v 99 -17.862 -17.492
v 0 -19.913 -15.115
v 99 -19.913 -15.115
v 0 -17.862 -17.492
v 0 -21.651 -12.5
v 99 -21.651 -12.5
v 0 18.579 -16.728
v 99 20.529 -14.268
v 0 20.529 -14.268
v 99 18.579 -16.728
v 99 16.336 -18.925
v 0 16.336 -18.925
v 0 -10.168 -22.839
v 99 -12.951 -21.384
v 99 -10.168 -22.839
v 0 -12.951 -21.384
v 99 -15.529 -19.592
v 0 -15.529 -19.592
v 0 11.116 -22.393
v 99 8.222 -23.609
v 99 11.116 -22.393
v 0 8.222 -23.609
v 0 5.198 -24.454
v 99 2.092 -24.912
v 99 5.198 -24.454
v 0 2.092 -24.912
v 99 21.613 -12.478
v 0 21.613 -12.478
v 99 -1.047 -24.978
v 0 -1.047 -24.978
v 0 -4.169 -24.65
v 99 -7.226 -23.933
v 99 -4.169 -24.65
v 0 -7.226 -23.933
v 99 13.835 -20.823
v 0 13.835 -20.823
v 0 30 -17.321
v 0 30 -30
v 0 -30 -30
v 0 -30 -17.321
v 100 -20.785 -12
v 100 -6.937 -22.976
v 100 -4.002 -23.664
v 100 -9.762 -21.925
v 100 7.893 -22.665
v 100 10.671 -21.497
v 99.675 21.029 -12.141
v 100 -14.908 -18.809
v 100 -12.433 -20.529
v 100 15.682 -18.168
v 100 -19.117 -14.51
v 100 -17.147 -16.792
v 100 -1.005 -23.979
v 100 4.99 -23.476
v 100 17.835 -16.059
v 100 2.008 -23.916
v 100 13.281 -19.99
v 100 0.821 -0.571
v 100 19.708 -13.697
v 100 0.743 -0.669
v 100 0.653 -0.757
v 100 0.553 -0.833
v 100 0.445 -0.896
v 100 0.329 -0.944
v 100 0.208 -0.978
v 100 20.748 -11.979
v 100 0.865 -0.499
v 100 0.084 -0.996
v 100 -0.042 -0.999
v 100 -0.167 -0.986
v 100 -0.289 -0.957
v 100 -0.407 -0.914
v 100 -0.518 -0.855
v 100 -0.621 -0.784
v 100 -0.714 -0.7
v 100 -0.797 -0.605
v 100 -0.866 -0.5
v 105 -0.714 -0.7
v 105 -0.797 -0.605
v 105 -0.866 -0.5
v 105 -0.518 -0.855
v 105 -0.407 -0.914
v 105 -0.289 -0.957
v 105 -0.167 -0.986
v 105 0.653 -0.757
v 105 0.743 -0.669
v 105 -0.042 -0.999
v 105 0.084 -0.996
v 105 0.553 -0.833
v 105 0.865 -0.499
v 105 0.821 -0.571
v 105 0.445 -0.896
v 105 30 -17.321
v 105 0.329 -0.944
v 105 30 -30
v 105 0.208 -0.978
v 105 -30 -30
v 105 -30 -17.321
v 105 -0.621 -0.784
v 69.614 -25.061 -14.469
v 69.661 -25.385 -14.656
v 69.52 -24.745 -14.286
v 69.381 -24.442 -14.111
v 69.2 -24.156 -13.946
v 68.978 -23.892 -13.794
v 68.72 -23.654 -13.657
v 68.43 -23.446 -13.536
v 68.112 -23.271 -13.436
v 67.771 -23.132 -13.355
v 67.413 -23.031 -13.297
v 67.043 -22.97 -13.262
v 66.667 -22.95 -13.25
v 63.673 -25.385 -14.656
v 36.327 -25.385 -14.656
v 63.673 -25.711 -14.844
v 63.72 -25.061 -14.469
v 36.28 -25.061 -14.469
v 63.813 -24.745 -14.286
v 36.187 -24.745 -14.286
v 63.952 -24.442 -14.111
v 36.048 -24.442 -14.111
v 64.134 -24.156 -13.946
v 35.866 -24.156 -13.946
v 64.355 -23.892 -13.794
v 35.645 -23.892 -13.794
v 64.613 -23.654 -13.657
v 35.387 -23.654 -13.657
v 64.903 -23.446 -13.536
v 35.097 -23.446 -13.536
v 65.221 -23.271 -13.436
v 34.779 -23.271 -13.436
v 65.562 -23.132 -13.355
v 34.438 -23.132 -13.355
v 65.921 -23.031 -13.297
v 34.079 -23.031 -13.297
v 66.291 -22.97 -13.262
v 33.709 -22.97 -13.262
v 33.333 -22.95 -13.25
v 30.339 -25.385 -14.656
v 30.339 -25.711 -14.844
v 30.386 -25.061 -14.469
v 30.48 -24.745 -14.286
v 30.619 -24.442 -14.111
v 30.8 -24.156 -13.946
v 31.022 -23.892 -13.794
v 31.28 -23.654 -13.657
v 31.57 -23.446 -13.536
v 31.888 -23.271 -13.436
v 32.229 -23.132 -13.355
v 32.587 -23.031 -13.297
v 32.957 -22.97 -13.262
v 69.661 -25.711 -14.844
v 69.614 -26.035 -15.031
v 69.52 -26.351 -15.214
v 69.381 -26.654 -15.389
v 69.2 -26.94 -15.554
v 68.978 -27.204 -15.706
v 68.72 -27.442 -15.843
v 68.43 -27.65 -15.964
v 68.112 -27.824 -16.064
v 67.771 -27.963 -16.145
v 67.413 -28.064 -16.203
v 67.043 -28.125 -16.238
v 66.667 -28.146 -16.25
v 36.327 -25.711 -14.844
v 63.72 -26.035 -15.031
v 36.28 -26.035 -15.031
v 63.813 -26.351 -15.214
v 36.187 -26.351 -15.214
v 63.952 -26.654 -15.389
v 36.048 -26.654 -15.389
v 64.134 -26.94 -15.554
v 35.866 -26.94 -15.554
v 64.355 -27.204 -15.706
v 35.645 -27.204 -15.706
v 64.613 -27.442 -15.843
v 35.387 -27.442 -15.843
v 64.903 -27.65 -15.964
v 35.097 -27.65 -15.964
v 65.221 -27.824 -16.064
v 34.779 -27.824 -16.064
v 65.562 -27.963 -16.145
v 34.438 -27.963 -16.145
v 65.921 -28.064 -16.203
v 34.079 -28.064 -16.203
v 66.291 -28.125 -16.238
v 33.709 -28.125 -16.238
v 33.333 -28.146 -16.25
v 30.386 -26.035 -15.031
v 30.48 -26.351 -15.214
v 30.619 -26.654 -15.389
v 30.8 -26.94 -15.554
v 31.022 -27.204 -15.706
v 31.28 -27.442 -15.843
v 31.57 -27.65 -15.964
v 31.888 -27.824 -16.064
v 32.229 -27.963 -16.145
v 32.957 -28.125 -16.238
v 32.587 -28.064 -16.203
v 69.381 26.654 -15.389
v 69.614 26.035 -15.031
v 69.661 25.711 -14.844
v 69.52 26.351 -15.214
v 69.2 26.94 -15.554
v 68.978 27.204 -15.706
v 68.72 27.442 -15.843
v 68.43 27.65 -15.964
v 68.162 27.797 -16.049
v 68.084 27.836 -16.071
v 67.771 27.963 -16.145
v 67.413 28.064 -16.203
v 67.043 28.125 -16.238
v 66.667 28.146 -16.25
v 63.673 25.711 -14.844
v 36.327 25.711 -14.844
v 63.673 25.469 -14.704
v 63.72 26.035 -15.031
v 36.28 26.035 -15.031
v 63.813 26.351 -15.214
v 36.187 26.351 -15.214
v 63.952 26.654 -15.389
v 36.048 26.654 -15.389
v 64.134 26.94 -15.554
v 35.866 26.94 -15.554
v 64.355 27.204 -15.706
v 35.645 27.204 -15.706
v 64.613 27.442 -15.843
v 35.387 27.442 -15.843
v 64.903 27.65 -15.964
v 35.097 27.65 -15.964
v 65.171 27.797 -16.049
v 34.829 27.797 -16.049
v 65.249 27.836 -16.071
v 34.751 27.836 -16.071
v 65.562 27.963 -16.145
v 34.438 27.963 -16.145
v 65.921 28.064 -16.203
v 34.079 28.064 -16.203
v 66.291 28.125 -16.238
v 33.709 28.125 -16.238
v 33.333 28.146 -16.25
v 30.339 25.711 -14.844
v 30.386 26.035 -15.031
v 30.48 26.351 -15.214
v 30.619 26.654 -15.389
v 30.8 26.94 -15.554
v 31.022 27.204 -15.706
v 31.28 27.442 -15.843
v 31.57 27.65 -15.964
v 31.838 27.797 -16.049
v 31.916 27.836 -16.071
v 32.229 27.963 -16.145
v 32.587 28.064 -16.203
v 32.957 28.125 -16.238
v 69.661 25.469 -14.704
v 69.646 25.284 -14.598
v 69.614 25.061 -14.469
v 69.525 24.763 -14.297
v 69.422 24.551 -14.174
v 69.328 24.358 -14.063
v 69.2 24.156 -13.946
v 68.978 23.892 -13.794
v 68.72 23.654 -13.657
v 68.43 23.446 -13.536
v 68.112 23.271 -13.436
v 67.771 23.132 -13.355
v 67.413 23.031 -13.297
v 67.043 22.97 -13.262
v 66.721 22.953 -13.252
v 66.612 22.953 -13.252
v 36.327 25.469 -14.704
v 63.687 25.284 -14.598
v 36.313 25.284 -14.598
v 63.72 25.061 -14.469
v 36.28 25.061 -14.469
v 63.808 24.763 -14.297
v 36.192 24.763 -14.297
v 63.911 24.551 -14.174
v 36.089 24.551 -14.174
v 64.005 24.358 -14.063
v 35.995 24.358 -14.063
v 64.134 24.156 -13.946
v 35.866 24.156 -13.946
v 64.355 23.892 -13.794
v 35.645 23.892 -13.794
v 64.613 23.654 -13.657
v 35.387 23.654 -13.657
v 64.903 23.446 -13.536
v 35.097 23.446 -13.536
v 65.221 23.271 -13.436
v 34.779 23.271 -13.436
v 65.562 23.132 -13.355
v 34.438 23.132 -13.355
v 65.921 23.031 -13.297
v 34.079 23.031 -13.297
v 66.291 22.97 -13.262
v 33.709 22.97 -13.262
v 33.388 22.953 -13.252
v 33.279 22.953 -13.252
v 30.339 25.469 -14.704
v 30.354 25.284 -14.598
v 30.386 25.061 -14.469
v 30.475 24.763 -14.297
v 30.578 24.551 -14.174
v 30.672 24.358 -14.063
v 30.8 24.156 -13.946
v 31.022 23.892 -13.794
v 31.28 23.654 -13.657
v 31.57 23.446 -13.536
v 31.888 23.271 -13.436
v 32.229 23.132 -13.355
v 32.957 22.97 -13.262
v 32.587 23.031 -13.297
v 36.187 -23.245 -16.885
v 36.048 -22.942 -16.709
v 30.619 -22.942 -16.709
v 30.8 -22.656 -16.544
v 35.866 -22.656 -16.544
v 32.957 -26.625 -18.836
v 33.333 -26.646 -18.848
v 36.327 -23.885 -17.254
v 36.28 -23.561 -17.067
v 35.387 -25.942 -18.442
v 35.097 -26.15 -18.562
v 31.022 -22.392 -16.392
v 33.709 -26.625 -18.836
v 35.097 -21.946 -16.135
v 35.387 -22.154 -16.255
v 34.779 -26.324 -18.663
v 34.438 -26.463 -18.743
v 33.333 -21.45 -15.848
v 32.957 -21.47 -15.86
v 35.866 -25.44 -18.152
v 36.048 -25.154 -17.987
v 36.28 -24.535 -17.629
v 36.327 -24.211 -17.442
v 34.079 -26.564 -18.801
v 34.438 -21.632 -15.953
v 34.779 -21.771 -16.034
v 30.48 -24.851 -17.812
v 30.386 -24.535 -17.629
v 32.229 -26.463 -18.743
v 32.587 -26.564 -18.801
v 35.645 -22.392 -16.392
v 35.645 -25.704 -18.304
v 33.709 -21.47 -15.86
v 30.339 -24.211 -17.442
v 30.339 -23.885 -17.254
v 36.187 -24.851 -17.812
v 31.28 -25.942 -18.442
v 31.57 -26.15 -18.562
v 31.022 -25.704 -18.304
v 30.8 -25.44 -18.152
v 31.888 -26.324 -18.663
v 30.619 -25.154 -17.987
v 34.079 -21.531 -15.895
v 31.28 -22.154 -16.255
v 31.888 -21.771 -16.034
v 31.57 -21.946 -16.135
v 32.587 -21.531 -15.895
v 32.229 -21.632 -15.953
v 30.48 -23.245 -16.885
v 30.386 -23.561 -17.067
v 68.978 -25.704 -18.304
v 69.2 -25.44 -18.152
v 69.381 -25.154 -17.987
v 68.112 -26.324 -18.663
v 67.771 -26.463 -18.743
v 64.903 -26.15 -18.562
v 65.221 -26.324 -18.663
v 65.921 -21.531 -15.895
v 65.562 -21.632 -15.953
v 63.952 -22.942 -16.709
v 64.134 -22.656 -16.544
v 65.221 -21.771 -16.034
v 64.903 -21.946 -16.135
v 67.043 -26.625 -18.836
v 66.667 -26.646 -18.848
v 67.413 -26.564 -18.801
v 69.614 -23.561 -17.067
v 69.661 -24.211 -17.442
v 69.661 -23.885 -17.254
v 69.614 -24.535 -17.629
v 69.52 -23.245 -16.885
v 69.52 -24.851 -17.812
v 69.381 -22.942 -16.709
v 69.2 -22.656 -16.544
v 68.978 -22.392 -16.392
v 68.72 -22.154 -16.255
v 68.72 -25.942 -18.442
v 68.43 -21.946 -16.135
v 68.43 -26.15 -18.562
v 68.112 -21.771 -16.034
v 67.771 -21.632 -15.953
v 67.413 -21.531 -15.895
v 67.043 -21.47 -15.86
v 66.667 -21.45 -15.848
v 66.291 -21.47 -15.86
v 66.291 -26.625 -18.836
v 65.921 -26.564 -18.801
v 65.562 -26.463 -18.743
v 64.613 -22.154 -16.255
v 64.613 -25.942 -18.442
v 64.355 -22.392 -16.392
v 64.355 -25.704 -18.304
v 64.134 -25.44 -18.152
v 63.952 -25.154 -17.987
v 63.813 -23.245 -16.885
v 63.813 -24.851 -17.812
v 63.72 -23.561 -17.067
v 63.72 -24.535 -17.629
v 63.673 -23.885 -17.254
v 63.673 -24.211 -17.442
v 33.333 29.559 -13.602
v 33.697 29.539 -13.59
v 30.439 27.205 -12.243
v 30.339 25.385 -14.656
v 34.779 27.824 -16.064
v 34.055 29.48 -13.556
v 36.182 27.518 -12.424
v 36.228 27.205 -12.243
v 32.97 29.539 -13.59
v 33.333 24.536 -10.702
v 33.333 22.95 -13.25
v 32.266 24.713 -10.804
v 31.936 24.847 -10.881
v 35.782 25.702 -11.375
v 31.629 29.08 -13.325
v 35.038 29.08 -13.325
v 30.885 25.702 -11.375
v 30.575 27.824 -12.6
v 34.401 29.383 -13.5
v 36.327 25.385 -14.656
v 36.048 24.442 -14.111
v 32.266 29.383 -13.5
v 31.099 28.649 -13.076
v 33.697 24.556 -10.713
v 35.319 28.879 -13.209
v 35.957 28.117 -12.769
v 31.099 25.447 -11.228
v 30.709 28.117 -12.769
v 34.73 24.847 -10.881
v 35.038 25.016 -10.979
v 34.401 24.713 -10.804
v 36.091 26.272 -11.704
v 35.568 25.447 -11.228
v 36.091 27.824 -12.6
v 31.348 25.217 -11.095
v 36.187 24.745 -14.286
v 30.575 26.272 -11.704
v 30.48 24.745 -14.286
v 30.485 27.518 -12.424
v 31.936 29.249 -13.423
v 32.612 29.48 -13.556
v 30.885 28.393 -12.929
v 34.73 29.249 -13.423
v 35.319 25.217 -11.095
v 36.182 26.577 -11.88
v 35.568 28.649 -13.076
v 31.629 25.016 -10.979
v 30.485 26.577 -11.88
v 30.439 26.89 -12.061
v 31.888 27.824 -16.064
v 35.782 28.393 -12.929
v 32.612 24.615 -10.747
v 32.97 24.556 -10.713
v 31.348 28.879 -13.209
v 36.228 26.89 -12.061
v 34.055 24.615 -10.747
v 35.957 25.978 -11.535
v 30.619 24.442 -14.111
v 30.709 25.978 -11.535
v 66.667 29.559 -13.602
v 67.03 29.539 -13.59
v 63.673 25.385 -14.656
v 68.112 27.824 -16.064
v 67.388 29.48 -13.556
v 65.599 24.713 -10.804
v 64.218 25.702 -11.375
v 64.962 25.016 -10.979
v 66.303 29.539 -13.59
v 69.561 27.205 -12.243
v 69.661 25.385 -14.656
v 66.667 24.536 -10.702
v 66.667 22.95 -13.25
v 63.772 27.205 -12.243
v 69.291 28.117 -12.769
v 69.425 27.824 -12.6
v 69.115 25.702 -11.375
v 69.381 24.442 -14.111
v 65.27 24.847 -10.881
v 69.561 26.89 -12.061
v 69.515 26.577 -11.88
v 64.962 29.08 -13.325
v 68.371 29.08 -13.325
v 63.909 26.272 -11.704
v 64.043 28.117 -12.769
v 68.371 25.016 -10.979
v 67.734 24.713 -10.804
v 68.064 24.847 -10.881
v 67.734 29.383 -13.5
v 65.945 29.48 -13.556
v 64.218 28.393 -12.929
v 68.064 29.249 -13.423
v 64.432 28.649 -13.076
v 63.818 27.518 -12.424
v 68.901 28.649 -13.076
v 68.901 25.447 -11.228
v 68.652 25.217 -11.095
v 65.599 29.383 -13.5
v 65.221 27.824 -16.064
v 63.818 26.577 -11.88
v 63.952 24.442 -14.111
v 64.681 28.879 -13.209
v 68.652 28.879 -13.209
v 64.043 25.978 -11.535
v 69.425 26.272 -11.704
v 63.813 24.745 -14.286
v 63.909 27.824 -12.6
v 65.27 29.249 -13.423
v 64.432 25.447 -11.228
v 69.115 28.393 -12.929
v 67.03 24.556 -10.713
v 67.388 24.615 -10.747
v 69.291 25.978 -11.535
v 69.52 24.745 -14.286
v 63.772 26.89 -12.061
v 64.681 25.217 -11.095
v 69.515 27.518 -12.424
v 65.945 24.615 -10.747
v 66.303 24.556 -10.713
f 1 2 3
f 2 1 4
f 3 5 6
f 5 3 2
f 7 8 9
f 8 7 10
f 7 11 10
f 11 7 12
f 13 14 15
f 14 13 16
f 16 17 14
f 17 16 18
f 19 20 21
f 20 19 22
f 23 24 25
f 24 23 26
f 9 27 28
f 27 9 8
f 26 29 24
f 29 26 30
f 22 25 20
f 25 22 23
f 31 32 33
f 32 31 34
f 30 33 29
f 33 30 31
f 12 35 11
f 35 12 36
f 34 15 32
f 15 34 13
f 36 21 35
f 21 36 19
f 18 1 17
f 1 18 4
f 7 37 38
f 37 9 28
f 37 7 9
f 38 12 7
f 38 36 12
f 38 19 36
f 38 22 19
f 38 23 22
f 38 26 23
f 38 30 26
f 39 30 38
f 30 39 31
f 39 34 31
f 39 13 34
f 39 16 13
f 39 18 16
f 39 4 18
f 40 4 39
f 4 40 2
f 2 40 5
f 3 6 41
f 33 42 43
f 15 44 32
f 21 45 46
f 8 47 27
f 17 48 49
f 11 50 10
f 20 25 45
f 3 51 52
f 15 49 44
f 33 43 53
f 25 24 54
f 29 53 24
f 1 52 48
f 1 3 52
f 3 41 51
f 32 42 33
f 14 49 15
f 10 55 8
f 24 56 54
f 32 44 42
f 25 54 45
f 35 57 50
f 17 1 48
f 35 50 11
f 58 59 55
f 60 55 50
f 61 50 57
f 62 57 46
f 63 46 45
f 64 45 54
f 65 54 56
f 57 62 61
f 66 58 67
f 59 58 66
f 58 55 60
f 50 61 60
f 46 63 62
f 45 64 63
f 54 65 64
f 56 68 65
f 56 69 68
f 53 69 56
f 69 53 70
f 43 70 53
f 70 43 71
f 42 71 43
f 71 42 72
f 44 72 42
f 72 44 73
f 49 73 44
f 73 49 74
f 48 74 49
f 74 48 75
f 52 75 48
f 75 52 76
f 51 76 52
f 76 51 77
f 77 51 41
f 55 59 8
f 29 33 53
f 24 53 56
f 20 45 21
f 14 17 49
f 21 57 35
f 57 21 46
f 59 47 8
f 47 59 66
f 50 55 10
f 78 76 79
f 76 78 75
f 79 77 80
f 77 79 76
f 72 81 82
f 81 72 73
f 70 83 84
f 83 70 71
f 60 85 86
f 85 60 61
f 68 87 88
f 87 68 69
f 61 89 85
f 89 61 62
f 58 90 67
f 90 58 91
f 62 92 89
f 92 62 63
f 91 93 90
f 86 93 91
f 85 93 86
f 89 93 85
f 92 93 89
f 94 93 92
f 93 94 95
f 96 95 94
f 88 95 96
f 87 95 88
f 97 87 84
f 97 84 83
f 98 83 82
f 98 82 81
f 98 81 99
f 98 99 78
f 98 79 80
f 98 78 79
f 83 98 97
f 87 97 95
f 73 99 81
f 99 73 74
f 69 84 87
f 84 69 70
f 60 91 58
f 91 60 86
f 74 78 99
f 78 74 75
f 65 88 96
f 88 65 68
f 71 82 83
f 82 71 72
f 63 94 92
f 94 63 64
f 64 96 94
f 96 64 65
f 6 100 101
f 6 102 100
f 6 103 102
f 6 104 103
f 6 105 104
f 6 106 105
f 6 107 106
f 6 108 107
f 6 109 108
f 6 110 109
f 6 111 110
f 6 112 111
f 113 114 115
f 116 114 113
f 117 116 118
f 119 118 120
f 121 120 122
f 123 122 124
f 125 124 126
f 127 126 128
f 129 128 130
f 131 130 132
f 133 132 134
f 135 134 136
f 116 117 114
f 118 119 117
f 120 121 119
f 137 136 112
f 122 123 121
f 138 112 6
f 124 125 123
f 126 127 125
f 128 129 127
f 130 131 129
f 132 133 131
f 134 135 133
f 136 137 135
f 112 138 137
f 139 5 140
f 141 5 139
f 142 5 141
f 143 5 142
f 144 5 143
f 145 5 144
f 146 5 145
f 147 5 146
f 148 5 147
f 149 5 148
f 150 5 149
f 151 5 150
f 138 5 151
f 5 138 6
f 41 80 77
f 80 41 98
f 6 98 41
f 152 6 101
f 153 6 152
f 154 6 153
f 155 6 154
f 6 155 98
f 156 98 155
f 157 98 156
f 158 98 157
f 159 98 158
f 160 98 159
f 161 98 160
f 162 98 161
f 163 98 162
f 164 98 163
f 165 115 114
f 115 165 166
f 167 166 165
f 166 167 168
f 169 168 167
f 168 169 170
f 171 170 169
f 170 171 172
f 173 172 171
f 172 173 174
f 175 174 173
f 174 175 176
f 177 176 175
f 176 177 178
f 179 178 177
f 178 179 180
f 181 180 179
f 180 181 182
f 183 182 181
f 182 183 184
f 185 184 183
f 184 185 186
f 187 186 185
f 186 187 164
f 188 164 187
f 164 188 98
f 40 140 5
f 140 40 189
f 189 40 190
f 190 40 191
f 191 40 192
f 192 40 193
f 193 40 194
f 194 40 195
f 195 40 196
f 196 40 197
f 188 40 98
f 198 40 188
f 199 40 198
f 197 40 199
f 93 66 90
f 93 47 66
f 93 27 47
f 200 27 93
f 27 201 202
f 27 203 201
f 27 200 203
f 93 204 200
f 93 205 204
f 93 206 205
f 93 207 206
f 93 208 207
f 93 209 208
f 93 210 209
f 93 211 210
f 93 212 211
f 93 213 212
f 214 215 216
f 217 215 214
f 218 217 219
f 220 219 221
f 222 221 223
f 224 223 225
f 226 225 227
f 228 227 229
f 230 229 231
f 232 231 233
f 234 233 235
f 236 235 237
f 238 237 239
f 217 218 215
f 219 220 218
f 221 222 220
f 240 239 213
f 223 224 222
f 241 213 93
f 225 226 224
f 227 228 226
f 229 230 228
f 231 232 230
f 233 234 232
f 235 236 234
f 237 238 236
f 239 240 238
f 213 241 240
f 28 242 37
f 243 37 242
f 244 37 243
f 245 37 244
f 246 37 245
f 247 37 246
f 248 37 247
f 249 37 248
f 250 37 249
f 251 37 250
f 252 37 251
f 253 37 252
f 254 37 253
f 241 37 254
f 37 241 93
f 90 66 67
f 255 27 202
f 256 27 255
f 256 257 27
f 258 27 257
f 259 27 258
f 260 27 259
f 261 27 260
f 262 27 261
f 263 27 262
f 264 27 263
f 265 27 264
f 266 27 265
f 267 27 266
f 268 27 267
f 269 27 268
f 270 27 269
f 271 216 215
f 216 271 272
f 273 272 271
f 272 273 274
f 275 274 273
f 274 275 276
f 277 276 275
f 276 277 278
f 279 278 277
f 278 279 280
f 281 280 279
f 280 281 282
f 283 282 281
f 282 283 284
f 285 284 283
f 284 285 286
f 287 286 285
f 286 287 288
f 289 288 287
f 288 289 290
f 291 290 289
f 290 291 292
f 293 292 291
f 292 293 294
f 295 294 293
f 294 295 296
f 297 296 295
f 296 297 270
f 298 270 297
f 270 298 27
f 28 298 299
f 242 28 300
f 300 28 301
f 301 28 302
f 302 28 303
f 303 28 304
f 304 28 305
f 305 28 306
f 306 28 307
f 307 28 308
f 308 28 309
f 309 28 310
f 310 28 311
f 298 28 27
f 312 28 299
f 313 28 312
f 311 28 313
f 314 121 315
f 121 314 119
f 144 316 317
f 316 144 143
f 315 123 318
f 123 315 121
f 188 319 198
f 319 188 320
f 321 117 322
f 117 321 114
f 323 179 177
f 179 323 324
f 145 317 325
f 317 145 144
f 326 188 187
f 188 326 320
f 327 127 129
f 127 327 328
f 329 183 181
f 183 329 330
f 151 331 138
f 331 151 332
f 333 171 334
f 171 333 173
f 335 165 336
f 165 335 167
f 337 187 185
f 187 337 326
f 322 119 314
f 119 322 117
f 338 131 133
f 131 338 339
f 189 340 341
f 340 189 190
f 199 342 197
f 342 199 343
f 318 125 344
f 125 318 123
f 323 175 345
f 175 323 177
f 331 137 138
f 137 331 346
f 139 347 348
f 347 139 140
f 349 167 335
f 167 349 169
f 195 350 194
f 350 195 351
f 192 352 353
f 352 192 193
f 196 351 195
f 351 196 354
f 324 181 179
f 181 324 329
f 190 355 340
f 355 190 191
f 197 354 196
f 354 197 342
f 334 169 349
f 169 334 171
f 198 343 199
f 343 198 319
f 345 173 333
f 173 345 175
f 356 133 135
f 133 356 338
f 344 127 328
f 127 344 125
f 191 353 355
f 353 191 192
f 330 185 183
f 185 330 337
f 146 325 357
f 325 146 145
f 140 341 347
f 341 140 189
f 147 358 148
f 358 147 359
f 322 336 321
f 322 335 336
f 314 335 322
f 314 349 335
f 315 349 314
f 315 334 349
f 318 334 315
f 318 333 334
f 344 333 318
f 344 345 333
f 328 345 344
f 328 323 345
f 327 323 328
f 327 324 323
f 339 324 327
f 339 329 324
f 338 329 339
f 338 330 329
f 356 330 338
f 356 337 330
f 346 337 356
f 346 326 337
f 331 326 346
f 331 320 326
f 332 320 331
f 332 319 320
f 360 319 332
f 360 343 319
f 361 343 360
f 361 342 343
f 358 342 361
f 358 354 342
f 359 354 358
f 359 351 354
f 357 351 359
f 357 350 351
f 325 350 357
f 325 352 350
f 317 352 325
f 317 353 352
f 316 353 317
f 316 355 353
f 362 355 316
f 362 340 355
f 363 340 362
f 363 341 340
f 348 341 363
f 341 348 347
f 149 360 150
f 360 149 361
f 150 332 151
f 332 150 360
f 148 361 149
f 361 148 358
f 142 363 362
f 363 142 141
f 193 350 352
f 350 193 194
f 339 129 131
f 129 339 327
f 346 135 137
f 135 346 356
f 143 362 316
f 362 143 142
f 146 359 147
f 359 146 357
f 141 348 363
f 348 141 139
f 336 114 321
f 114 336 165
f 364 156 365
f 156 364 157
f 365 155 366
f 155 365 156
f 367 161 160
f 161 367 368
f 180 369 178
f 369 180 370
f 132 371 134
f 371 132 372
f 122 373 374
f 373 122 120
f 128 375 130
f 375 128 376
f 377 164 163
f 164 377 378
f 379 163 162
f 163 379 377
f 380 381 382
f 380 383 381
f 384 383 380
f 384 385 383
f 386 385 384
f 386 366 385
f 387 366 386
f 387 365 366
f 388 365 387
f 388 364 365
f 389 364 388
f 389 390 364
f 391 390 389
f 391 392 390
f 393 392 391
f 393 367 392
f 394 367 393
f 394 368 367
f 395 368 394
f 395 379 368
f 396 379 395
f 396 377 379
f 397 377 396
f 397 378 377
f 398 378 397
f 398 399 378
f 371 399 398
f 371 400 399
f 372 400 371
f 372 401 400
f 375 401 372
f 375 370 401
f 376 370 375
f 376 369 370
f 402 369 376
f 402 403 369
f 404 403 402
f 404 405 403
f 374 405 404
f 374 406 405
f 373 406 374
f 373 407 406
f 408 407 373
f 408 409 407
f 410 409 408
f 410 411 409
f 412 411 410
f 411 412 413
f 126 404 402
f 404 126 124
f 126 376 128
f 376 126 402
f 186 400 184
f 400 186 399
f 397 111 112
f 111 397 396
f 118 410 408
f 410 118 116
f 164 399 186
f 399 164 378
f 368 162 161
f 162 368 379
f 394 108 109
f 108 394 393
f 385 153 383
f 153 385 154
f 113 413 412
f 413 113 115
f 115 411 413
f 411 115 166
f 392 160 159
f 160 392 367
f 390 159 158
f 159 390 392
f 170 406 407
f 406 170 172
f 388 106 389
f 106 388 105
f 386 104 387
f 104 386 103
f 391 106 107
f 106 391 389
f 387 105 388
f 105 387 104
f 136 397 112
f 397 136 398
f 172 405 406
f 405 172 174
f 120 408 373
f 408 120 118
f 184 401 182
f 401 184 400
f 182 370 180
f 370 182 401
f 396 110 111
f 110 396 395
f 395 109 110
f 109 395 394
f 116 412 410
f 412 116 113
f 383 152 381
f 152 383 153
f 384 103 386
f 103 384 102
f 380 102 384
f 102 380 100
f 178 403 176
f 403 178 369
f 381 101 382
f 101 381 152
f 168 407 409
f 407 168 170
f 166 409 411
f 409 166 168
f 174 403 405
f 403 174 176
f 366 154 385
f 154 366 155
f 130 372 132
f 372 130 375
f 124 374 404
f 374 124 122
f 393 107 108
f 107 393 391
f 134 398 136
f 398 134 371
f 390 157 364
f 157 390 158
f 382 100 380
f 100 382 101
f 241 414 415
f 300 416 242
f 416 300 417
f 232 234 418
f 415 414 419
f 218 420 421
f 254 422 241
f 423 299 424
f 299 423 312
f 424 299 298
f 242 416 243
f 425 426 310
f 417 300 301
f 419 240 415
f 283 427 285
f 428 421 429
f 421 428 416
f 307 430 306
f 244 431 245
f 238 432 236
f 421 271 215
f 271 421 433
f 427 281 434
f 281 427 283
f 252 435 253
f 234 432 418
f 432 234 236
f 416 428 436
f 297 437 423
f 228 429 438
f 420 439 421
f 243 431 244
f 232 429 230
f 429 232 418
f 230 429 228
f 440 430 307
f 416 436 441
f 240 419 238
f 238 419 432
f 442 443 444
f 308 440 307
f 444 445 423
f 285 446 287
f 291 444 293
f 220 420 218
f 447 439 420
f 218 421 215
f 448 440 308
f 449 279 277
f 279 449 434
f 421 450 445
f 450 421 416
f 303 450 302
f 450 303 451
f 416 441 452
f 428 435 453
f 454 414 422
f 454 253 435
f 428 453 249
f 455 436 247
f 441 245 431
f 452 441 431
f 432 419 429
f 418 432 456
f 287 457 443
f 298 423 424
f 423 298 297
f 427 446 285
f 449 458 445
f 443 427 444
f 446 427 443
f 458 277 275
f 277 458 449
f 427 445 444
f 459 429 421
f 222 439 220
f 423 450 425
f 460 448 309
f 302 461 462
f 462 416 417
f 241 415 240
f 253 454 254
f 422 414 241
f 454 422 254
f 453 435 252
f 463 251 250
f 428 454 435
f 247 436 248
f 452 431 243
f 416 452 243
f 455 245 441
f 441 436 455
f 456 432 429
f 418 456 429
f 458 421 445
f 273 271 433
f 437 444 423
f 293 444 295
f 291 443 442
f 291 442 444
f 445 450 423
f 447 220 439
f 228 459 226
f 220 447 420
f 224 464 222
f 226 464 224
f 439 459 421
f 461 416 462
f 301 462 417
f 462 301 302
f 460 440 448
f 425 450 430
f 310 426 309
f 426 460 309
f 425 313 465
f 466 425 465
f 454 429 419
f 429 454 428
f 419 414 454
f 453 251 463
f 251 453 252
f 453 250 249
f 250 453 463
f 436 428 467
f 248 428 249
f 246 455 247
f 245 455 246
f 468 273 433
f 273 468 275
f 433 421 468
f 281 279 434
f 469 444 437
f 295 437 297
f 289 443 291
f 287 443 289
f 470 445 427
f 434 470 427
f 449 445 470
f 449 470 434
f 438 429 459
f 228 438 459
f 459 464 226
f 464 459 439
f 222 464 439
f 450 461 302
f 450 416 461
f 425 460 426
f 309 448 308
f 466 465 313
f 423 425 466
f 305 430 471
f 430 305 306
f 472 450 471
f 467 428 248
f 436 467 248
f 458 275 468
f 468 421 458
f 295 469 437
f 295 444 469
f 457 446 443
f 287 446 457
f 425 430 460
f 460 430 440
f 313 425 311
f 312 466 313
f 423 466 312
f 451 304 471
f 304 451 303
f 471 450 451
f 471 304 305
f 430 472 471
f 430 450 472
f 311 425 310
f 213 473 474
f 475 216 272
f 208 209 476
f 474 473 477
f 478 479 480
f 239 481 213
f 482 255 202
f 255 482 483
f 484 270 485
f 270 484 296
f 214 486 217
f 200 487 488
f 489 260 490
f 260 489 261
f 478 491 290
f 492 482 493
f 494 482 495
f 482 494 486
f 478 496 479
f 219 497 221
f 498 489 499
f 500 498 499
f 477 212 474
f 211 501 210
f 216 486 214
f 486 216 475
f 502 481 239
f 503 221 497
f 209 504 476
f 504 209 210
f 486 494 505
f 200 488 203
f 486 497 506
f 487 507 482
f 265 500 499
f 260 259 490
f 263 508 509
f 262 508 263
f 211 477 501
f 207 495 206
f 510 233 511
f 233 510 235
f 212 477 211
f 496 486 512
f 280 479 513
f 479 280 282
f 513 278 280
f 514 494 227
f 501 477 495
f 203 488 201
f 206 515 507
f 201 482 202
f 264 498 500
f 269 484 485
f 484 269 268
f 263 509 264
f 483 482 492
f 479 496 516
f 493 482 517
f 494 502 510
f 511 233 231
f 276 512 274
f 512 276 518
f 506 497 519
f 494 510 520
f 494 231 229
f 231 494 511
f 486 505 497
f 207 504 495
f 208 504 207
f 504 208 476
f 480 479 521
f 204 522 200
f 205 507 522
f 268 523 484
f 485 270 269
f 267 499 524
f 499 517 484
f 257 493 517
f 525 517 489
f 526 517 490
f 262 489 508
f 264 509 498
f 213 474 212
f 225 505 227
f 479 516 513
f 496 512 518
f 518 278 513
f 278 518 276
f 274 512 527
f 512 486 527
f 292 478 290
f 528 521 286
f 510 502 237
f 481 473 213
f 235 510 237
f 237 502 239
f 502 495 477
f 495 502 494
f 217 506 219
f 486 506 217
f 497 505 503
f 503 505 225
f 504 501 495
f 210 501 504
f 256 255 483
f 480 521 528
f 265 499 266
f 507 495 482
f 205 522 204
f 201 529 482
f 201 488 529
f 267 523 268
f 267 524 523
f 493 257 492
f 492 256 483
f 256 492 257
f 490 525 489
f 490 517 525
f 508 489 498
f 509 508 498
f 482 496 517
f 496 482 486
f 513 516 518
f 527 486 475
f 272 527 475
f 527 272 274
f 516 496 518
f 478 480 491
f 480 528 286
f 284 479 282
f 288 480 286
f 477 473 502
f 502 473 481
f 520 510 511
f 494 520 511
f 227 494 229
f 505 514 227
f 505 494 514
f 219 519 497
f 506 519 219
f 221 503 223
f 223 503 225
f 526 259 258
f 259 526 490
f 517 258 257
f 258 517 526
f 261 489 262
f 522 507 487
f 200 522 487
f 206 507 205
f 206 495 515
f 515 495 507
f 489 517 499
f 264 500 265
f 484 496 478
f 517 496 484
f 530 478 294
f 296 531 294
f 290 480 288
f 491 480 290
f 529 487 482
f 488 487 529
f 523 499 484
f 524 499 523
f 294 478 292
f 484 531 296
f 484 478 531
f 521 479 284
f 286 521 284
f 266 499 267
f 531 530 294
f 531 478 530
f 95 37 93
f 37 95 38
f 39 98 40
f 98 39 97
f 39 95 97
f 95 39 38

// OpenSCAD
// a high number is more round, low number is more lo-poly
$fn=50;

// height of candle in mm
height= 100;

// diameter of candle in mm
diameter= 50;

// diameter of wick in mm
wick = 2;

// diameter of pins that help align the mold
pin_size  = 3;

// the pins are slightly conical, smaller at the end.   this amount is how much smaller.   This helps the pins to fit into the holes. 
pin_epsilon = 0.1;

// There can be a 45 degree bevel at the top of the candle. 
bevel = 1;

module  section()
{
    difference(){
        union(){
            union(){ 
                cylinder(r=diameter/2, h=height-bevel);// main cylinder of candle
                translate([0,0,height-bevel])
                    cylinder(r1=diameter/2, r2 = diameter/2 - bevel, h=bevel);
                translate([0,0,height-5])cylinder(r=wick/2,h=10);// wick
            }
            union(){ //we only want 1/3rd, so block the rest out
                translate([0,-diameter,0])cube([diameter,diameter,height+10]);
                translate([-diameter,-diameter,0])cube([diameter,diameter,height+10]);
                rotate([0,0,360/3])cube([diameter,diameter,height+10]);    
            }
          
            translate([diameter/2 + pin_size*3/2,pin_size,height/3])// pins
                rotate([90,0,0])cylinder(r=pin_size, h=pin_size);
            translate([diameter/2 + pin_size*3/2,pin_size,(height*2)/3])
                rotate([90,0,0])cylinder(r=pin_size, h=pin_size);
        }
    union(){   
        rotate([0,0,360/3])// holes the pins fit into
            translate([diameter/2 + pin_size*3/2,pin_size,height/3])
                rotate([90,0,0])cylinder(r2=pin_size,r1=pin_size-pin_epsilon, h=pin_size);
        rotate([0,0,360/3])
            translate([diameter/2 + pin_size*3/2,pin_size,(height*2)/3])
                rotate([90,0,0])cylinder(r2=pin_size,r1=pin_size-pin_epsilon, h=pin_size);    
    }
  }  
}

rotate([-60,0,0])rotate([0,90,0])difference(){
    rotate([0,0,360/6])translate([0,-diameter*0.6,0])cube([diameter*.6,diameter*1.2,   height+5]);
    section();
}
